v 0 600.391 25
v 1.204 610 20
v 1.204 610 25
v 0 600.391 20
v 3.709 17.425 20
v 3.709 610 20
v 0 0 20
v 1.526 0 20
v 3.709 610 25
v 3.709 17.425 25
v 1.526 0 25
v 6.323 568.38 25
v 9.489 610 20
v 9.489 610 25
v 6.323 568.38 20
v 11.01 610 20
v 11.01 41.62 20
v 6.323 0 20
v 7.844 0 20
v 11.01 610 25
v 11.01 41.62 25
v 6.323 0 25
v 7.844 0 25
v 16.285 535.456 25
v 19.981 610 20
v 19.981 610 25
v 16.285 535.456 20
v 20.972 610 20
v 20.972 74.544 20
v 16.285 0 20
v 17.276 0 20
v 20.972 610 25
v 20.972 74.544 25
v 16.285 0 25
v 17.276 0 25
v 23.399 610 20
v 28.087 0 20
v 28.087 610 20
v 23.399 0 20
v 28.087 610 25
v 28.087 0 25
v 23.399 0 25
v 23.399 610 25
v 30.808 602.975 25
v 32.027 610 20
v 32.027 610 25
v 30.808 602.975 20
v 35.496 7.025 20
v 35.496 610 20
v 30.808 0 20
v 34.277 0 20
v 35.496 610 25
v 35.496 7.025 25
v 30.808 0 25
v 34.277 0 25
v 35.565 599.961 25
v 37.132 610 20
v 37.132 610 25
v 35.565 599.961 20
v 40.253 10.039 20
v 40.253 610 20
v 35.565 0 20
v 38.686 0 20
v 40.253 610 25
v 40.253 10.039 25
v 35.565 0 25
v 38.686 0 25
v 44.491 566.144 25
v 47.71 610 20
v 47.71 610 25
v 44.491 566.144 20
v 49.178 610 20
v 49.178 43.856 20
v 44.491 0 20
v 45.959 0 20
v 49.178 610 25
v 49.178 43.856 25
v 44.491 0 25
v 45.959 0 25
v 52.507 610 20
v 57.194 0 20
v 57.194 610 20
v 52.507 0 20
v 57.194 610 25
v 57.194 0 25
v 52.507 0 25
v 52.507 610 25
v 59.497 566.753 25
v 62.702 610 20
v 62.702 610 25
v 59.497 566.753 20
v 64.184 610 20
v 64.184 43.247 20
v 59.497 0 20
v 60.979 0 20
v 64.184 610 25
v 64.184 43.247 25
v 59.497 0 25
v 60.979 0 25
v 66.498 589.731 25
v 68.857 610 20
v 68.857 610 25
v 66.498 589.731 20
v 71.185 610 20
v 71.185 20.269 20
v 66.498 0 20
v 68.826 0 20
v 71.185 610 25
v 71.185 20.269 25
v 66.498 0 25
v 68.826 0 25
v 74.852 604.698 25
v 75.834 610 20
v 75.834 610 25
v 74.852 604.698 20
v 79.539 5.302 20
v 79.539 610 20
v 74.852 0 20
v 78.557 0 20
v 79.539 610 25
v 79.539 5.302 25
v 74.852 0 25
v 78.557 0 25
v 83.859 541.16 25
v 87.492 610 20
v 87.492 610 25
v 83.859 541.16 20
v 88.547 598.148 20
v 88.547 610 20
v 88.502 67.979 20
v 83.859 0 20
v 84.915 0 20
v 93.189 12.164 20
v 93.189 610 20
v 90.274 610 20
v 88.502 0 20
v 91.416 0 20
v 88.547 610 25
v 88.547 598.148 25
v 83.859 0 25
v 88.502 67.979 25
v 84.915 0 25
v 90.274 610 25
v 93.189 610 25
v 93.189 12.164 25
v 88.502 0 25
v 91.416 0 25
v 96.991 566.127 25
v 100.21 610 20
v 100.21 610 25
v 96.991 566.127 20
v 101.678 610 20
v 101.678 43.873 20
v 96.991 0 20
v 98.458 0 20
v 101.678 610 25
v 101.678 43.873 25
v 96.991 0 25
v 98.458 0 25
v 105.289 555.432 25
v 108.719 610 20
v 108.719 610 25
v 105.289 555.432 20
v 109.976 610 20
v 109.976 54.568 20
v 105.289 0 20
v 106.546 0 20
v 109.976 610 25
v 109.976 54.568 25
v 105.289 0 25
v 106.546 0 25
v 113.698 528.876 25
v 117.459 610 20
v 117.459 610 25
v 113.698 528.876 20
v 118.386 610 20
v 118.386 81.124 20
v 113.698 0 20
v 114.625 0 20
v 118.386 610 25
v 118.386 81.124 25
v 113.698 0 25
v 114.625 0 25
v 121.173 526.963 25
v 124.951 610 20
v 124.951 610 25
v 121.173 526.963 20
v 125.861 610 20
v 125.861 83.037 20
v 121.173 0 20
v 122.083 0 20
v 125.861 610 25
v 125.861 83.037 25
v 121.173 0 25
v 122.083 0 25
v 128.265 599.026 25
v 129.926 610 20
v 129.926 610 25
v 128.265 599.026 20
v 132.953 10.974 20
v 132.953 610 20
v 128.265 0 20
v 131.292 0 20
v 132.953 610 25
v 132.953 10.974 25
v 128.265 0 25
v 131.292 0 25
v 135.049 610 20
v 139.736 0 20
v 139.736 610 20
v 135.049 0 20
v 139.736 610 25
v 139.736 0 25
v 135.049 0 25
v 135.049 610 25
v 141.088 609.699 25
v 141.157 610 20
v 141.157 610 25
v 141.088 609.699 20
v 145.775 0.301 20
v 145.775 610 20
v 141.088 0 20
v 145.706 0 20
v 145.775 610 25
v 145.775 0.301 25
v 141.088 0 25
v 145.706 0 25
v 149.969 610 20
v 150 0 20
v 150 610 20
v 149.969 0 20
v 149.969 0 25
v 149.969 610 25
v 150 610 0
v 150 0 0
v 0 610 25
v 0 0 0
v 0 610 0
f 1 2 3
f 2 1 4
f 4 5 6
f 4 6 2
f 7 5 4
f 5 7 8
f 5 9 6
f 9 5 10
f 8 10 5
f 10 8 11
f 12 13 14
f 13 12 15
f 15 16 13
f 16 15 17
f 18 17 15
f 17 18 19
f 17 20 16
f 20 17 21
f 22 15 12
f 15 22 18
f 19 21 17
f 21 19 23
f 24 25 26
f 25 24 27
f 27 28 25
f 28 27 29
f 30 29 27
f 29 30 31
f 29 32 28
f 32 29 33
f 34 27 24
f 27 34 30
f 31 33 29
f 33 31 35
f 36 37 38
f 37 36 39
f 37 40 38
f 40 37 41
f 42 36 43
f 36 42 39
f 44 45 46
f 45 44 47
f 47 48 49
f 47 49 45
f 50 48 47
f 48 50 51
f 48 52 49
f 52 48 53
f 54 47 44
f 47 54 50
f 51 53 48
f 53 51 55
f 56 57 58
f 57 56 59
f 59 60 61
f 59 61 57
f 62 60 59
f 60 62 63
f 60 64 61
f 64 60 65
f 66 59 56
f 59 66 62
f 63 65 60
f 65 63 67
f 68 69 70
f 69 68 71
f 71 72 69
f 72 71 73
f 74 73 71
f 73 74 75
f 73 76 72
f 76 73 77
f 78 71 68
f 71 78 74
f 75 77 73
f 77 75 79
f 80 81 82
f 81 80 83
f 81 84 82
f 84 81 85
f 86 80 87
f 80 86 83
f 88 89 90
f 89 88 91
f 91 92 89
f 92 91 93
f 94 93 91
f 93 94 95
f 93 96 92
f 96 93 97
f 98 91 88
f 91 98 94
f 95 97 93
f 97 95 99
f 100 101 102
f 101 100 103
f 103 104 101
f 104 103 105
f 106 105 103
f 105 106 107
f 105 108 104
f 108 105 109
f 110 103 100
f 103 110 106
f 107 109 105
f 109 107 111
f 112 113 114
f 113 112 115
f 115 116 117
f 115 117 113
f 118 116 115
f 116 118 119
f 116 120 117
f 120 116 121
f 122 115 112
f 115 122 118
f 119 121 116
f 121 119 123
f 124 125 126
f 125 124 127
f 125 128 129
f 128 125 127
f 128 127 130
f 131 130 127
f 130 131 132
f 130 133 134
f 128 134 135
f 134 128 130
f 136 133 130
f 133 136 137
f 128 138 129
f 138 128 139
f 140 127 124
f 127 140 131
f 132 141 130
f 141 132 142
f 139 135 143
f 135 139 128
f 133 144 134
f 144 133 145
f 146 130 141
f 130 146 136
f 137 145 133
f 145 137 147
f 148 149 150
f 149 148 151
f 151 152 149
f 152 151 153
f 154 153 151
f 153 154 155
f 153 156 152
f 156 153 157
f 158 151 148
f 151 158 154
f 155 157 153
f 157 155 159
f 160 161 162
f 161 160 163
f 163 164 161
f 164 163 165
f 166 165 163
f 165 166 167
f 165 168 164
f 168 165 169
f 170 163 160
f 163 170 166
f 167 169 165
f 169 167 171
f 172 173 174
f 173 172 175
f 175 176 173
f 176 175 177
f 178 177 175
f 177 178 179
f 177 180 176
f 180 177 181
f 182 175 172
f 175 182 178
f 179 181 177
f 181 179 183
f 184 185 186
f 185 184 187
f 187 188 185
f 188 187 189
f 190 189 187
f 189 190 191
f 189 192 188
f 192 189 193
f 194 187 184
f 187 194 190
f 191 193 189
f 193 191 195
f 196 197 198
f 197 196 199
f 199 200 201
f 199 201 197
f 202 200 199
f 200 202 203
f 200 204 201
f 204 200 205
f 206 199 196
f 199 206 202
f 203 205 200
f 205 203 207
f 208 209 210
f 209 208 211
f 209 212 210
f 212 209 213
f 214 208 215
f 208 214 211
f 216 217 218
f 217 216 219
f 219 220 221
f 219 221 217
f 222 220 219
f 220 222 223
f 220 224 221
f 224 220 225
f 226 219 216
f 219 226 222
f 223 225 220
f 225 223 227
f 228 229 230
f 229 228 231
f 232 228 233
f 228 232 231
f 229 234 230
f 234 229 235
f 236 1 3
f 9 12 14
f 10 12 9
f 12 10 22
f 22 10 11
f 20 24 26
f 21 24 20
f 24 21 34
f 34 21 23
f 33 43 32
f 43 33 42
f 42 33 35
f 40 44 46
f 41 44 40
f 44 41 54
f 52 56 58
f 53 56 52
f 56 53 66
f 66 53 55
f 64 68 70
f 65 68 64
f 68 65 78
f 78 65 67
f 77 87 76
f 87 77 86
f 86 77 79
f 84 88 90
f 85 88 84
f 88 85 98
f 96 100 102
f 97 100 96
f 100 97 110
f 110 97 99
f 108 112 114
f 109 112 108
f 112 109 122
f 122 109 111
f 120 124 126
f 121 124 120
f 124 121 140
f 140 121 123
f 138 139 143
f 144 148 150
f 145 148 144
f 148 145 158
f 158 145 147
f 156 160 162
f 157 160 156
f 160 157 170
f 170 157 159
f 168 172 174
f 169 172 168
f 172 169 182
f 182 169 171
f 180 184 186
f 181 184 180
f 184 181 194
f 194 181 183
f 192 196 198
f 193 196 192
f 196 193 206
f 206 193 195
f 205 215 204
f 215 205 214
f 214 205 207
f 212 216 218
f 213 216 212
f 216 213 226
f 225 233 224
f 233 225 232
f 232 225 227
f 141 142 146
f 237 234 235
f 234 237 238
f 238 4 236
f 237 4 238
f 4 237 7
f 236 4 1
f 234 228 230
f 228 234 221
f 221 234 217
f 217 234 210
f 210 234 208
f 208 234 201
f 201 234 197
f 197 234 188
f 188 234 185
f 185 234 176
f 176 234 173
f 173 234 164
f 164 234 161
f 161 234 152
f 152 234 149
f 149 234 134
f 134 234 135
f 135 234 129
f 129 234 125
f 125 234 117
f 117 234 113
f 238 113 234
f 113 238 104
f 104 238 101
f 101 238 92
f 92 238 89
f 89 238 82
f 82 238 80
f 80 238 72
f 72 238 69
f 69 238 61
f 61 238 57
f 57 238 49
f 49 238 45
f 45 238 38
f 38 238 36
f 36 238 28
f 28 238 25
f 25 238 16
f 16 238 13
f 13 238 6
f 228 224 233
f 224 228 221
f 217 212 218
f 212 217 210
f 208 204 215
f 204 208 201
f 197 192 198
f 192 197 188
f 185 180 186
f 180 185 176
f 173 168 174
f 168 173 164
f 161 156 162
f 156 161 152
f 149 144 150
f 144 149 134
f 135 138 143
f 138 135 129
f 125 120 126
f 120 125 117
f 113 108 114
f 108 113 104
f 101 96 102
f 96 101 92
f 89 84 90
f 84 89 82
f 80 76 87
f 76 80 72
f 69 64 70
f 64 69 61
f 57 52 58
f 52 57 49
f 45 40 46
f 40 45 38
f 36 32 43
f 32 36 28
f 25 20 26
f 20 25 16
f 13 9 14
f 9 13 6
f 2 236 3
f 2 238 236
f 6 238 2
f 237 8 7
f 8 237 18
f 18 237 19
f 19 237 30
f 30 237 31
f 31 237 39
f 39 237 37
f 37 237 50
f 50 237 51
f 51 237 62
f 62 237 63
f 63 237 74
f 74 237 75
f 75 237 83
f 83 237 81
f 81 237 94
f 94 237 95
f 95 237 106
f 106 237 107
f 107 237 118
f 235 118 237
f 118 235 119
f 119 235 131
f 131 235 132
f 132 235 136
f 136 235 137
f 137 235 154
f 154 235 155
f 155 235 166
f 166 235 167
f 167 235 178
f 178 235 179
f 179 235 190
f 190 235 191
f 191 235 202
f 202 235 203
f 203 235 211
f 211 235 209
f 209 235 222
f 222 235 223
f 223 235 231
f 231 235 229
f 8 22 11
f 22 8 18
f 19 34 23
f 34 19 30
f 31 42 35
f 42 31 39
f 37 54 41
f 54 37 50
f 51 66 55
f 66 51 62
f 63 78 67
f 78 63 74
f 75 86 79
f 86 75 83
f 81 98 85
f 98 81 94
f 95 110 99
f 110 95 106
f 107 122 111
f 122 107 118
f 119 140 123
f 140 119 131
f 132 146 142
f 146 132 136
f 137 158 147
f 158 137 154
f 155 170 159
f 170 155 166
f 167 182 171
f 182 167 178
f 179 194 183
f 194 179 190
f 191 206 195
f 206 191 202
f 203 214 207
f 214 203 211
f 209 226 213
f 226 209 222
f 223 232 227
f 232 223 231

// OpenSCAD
// Define block dimensions
block_length = 610;  // length of the block in mm
block_width = 150;    // width of the block in mm
block_height = 25;   // height of the block in mm

// Parameters for the wood grain pattern
grain_overlap = 20; //grain development needs to overlap the block so the ends don't all come to a point
grain_width = 2.5;
function grain_count() = block_width/80; //Higher divisor is more lines, lower divisor is less lines
function segments_in_line(seed) = rands(.1 * block_length, .2 * block_length, 1, seed=seed);
function line_amplitude(x, seed) = rands(x-(2), x+(2), 1, seed=seed);

module grainSegment(xStart, xEnd, seed) {
    seg1 = [ for (y = [-grain_overlap:segments_in_line(seed=seed)[0]:block_length+grain_overlap]) let(x = line_amplitude(x=xStart,seed=seed)[0]) [x,y]];
    seg2 = [ for (y = [block_length+grain_overlap:-segments_in_line(seed=seed)[0]:-grain_overlap]) let(x = line_amplitude(x=xEnd,seed=seed)[0]) [x,y]];
    
    segment = concat(seg1,seg2);
    polygon(segment);
}

// TEST grainSegment
*linear_extrude(height = block_height)
    grainSegment(xStart=-grain_width,xEnd=grain_width, seed=22);


module grainPattern() {
    btwn_grains = grain_width * grain_count();
    width_grain = grain_width * 1.6 * grain_count();
    seedlings = [ for (xLeft = [0:width_grain:block_width]) let(xRight = xLeft+btwn_grains) let(seed = rands(1,5000,1)) [xLeft, xRight, seed[0]] ];
    for (i = [ 0 : len(seedlings) - 1 ]) {
        linear_extrude(height = block_height)
            grainSegment(xStart=seedlings[i][0], xEnd=seedlings[i][1], seed=seedlings[i][2]);
    }
    //TODO: implement grainPattern so that a desired set of seedlings can be re-used to render an identical pattern
    echo(seedlings);
}

difference() {
cube([block_width, block_length, block_height]);
translate([0,0,block_height*.8])
    grainPattern();
}
